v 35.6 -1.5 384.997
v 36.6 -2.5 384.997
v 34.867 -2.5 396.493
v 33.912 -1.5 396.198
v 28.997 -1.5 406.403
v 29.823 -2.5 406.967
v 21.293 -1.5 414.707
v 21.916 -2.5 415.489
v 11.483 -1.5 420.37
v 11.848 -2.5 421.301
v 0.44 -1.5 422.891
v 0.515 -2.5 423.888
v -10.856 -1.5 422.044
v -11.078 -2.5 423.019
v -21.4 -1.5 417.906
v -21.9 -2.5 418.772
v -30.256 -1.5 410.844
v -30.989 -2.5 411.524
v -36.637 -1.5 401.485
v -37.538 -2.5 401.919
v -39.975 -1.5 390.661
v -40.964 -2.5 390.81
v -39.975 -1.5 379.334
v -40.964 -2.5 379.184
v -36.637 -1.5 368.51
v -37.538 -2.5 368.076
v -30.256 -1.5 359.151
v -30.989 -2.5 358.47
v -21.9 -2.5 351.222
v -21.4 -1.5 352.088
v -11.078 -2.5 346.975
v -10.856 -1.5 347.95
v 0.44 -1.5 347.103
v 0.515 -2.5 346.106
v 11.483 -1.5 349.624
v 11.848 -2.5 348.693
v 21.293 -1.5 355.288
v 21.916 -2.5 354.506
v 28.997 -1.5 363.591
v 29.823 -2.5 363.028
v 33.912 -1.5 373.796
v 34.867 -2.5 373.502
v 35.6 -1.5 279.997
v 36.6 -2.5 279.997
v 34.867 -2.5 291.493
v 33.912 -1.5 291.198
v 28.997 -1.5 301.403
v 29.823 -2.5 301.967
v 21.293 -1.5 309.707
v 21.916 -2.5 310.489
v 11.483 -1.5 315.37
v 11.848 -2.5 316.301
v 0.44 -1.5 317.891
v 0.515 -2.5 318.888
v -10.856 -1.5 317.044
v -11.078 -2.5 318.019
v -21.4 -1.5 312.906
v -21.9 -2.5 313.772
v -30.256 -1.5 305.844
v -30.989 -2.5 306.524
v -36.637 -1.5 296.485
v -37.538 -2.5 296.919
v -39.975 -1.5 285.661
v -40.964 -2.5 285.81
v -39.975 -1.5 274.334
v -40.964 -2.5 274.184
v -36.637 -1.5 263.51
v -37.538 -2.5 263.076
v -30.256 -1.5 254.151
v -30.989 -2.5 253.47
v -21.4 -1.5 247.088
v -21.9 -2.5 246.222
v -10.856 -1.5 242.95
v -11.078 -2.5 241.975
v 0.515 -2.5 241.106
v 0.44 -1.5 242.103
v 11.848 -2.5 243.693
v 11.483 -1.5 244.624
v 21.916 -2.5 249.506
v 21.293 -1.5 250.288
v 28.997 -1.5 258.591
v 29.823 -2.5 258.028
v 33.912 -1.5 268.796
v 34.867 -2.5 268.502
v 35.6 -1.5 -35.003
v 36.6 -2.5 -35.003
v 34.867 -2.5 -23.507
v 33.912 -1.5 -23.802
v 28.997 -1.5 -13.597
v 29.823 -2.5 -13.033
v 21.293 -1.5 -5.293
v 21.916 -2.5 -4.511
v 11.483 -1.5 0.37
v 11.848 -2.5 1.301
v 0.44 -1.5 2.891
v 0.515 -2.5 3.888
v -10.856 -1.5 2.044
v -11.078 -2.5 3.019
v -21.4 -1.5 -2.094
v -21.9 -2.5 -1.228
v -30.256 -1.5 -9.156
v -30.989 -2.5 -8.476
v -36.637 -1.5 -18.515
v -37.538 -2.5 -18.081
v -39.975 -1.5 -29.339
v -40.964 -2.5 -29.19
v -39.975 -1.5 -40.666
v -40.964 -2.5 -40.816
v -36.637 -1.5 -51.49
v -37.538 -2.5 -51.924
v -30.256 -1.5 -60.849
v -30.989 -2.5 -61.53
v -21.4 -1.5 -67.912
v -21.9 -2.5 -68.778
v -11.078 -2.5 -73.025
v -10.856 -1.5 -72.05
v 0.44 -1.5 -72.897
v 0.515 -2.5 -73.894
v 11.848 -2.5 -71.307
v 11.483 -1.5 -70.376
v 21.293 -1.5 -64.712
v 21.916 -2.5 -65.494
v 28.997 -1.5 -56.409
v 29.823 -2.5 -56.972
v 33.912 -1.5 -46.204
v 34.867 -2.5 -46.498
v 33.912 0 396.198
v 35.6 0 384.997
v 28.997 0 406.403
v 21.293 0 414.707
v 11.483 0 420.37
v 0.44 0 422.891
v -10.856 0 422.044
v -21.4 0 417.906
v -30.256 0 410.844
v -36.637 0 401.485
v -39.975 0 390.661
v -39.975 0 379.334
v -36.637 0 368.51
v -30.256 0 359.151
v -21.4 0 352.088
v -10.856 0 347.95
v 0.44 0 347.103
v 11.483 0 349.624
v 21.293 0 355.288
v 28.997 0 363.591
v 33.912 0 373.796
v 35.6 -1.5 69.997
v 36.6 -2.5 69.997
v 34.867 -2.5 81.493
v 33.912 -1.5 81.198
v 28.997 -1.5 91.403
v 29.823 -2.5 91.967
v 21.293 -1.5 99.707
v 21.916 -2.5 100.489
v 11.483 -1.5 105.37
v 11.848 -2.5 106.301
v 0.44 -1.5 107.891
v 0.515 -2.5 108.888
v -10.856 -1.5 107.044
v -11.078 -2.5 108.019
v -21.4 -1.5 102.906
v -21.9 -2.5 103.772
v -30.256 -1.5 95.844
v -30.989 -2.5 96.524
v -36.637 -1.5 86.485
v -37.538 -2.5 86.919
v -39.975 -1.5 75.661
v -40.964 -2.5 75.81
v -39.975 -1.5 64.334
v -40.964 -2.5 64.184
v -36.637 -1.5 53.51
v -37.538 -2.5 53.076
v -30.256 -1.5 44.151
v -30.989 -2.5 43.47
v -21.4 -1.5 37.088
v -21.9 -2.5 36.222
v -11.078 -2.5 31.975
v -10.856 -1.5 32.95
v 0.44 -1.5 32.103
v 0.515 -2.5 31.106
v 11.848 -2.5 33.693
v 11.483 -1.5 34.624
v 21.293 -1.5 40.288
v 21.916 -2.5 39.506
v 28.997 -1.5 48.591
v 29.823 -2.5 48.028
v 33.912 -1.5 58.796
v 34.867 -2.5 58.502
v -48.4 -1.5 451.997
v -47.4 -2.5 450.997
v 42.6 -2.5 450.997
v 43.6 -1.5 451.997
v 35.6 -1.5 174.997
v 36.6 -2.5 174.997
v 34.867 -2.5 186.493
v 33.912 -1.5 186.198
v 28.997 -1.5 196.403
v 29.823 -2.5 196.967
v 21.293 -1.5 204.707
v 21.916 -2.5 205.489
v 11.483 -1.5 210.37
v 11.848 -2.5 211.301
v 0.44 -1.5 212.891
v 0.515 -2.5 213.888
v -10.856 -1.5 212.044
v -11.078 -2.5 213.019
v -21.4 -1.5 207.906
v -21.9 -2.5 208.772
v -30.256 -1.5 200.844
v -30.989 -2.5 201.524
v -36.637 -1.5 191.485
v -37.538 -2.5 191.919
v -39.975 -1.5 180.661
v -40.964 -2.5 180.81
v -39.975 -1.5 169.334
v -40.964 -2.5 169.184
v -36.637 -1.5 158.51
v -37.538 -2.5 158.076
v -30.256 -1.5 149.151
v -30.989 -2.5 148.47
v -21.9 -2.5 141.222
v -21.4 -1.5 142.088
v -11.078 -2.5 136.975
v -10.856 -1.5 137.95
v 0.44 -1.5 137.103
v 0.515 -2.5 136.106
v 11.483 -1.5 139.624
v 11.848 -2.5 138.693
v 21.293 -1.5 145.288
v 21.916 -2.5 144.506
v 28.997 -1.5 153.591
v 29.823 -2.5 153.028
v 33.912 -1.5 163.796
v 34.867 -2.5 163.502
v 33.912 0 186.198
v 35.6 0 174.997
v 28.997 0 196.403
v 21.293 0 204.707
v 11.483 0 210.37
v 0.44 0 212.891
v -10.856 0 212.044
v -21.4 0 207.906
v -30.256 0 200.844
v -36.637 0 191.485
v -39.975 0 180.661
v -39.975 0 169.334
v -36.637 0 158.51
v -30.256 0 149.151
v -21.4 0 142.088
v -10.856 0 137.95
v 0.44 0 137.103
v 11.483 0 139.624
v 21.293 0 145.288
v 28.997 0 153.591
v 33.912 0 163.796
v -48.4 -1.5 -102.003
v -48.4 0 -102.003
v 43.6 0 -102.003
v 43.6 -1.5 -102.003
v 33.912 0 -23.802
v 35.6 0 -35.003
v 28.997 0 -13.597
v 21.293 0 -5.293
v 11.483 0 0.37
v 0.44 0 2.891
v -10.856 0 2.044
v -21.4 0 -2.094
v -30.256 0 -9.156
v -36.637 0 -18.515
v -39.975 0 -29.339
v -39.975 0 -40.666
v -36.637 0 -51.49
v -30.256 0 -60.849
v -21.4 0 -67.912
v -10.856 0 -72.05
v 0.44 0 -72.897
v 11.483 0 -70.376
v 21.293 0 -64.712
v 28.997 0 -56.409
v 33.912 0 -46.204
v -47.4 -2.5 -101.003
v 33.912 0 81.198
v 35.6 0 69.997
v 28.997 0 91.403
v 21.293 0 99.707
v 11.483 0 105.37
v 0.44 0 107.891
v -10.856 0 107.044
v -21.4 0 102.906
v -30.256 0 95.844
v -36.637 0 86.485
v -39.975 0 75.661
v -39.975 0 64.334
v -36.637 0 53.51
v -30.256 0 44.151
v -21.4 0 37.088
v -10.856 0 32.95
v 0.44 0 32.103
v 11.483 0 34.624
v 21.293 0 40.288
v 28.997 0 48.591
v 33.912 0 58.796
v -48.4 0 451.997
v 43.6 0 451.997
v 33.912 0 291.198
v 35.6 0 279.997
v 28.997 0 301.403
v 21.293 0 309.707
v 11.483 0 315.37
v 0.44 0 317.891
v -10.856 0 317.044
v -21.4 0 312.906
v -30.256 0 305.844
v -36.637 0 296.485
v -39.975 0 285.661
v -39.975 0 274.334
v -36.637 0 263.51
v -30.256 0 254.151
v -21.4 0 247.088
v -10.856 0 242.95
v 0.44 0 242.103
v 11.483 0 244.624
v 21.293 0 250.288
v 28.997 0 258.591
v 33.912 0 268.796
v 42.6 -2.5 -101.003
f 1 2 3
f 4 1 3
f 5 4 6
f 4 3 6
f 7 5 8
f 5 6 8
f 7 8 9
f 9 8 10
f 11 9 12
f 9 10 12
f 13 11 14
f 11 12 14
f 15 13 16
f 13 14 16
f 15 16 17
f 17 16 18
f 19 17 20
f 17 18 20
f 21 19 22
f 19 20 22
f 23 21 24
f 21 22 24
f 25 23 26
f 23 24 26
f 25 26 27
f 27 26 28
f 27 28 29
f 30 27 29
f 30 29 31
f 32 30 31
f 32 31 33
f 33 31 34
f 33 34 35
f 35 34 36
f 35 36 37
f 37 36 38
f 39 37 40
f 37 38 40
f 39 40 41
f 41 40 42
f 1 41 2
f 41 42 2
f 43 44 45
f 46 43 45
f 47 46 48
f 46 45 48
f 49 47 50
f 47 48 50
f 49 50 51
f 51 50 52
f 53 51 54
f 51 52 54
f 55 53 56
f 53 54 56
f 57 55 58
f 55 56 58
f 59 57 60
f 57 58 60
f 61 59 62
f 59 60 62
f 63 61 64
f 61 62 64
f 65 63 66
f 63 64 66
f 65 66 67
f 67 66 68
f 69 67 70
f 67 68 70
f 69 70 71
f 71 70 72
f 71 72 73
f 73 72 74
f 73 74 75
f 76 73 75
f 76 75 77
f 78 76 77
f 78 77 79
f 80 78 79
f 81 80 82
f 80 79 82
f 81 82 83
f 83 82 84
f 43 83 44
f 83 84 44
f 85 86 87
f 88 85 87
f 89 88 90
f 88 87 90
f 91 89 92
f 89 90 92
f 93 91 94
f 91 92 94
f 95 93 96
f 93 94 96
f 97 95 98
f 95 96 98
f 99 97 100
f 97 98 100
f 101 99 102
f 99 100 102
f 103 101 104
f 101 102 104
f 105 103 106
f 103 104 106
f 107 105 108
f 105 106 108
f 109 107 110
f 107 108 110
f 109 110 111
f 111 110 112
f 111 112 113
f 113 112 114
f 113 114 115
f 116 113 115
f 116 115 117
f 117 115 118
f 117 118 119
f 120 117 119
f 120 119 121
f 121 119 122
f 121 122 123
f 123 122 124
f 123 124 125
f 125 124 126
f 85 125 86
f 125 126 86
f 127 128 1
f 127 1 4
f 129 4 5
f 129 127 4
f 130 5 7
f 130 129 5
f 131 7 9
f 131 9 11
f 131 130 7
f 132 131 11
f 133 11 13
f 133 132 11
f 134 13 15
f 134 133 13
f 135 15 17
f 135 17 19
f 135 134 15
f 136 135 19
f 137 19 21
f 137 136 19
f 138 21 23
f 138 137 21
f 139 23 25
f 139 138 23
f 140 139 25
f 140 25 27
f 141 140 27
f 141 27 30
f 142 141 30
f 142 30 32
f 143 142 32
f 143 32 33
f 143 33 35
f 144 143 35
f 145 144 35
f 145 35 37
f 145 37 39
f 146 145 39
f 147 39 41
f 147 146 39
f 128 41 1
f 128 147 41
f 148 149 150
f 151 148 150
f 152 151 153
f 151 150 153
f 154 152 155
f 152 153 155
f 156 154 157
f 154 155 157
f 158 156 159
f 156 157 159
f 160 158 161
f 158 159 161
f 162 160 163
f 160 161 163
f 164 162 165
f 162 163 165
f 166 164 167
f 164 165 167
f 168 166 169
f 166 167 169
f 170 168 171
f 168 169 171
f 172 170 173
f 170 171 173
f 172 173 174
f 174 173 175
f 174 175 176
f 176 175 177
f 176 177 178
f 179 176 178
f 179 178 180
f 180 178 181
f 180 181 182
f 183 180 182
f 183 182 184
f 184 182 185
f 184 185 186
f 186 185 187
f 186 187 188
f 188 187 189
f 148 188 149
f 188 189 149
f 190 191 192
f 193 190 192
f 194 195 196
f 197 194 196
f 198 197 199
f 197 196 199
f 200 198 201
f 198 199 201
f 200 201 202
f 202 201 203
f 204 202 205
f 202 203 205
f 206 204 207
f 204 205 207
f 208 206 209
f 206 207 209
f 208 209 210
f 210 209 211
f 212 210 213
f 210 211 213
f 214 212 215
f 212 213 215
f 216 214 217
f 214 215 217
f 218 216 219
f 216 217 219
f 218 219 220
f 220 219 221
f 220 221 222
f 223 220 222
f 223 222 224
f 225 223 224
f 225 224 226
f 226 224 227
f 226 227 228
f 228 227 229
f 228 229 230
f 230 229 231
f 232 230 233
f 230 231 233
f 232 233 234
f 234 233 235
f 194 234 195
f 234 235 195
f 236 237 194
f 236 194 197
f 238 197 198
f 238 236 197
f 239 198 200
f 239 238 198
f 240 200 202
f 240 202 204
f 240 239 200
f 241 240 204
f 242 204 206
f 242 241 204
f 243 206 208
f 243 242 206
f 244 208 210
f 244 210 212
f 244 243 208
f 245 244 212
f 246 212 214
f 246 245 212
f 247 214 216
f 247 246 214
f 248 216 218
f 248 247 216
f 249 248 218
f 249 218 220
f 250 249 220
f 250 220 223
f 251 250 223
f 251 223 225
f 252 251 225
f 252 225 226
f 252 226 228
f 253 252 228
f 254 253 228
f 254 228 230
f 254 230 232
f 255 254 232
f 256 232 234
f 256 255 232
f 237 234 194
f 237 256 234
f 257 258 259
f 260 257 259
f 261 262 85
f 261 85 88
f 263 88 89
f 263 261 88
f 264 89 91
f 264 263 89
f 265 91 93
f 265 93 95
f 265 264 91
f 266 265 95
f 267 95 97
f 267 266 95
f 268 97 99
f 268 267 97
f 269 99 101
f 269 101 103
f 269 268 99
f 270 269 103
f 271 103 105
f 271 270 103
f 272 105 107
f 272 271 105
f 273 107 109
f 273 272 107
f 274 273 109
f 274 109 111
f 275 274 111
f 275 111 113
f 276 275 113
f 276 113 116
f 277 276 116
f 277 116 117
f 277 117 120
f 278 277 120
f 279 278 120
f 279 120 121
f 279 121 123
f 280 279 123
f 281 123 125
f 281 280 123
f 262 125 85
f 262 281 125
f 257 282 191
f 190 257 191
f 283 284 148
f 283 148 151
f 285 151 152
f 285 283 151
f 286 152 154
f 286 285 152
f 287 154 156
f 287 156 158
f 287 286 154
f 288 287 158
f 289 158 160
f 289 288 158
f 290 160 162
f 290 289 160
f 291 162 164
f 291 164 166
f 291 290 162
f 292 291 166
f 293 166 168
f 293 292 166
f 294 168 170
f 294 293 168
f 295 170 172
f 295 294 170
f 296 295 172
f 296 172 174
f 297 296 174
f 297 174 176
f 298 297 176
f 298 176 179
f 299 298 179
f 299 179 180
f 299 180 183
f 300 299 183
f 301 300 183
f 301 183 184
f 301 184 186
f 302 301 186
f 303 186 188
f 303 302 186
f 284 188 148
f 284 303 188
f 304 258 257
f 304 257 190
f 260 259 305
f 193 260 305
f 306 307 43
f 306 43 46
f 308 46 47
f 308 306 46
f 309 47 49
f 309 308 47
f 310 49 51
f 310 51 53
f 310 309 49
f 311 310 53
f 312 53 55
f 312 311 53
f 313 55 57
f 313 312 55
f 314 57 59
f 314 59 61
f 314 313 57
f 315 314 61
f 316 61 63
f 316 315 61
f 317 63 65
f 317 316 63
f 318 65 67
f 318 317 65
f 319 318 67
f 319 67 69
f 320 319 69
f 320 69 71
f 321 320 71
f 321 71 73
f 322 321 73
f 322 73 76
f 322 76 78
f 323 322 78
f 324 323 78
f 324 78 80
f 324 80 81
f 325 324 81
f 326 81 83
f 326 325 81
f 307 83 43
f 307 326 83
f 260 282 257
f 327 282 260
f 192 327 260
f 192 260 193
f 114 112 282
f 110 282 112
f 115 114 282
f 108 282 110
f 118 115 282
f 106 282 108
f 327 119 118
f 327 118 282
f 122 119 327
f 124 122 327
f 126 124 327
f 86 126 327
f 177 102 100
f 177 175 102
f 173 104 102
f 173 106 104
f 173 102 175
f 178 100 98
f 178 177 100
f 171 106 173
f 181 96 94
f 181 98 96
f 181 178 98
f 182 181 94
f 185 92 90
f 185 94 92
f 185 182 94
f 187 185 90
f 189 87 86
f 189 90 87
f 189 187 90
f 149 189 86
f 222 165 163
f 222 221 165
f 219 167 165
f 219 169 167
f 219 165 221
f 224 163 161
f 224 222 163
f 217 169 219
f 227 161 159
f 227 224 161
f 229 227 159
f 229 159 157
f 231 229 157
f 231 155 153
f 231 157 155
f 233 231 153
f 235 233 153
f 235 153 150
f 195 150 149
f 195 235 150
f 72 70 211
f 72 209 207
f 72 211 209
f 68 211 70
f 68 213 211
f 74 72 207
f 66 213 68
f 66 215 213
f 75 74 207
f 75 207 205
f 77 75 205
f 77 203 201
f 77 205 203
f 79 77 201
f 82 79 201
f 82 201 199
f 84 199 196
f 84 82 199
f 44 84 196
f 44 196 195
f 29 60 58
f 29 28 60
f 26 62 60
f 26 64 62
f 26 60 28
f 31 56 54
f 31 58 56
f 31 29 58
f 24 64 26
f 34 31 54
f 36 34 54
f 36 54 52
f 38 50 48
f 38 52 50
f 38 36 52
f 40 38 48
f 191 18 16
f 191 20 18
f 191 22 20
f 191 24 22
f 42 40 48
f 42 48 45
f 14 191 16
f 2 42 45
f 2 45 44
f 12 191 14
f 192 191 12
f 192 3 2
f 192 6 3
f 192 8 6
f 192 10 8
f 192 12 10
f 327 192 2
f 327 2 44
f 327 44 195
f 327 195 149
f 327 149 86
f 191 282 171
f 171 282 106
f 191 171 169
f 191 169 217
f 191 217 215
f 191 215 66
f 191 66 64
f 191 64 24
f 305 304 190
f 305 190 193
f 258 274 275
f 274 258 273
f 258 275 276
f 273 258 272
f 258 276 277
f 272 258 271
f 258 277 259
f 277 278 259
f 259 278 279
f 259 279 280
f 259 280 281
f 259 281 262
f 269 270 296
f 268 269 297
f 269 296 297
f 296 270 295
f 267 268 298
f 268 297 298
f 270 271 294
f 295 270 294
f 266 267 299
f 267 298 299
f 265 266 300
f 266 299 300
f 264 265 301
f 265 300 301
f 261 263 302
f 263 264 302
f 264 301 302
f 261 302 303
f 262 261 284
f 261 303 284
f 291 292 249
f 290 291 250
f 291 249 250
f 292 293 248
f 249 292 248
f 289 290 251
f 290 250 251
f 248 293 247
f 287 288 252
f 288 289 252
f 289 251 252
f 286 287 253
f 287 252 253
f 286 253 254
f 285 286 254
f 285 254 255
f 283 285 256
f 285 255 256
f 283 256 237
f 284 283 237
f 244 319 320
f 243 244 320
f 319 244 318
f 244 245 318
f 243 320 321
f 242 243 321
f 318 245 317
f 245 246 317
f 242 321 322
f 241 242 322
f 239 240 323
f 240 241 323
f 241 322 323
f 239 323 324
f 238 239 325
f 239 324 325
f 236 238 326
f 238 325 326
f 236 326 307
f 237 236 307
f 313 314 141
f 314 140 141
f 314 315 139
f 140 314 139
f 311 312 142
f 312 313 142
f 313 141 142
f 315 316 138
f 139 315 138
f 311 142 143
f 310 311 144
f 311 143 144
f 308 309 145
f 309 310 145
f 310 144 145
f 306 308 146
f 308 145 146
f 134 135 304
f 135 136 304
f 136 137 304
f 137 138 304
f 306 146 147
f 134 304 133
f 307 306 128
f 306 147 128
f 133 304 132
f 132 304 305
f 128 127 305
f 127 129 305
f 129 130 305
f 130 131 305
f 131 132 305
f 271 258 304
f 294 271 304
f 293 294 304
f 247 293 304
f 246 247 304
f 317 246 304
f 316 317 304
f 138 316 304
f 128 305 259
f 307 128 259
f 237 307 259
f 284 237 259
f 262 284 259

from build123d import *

# Parameters (mm, degrees)
F0_W     = 92
F0_H     = 554
F0_R     = 38
F1_DEPTH = 2.5
F2_SIZE  = 1


with BuildPart() as f1:
    # F0 (on Front) → F1 (new body)
    with BuildSketch(Plane.XZ):
        with Locations((-2.399907, 174.997145)):
            Rectangle(F0_W, F0_H)
        with Locations((-2.399907, -35.002855)):
            Circle(F0_R, mode=Mode.SUBTRACT)
        with Locations((-2.399907, 69.997145)):
            Circle(F0_R, mode=Mode.SUBTRACT)
        with Locations((-2.399907, 174.997145)):
            Circle(F0_R, mode=Mode.SUBTRACT)
        with Locations((-2.399907, 279.997145)):
            Circle(F0_R, mode=Mode.SUBTRACT)
        with Locations((-2.399907, 384.997145)):
            Circle(F0_R, mode=Mode.SUBTRACT)
    extrude(amount=F1_DEPTH)

    # F2
    f2_edges = [f1.edges().sort_by_distance(p)[0] for p in [
        (-2.399907, -2.5, -102.002855),
        (43.600093, -2.5, 174.997145),
        (-2.399907, -2.5, 451.997145),
        (-48.399907, -2.5, 174.997145),
        (-40.399907, -2.5, -35.002855),
        (-40.399907, -2.5, 69.997145),
        (-40.399907, -2.5, 174.997145),
        (-40.399907, -2.5, 279.997145),
        (-40.399907, -2.5, 384.997145),
    ]]
    chamfer(f2_edges, length=F2_SIZE)


solid = f1.part
